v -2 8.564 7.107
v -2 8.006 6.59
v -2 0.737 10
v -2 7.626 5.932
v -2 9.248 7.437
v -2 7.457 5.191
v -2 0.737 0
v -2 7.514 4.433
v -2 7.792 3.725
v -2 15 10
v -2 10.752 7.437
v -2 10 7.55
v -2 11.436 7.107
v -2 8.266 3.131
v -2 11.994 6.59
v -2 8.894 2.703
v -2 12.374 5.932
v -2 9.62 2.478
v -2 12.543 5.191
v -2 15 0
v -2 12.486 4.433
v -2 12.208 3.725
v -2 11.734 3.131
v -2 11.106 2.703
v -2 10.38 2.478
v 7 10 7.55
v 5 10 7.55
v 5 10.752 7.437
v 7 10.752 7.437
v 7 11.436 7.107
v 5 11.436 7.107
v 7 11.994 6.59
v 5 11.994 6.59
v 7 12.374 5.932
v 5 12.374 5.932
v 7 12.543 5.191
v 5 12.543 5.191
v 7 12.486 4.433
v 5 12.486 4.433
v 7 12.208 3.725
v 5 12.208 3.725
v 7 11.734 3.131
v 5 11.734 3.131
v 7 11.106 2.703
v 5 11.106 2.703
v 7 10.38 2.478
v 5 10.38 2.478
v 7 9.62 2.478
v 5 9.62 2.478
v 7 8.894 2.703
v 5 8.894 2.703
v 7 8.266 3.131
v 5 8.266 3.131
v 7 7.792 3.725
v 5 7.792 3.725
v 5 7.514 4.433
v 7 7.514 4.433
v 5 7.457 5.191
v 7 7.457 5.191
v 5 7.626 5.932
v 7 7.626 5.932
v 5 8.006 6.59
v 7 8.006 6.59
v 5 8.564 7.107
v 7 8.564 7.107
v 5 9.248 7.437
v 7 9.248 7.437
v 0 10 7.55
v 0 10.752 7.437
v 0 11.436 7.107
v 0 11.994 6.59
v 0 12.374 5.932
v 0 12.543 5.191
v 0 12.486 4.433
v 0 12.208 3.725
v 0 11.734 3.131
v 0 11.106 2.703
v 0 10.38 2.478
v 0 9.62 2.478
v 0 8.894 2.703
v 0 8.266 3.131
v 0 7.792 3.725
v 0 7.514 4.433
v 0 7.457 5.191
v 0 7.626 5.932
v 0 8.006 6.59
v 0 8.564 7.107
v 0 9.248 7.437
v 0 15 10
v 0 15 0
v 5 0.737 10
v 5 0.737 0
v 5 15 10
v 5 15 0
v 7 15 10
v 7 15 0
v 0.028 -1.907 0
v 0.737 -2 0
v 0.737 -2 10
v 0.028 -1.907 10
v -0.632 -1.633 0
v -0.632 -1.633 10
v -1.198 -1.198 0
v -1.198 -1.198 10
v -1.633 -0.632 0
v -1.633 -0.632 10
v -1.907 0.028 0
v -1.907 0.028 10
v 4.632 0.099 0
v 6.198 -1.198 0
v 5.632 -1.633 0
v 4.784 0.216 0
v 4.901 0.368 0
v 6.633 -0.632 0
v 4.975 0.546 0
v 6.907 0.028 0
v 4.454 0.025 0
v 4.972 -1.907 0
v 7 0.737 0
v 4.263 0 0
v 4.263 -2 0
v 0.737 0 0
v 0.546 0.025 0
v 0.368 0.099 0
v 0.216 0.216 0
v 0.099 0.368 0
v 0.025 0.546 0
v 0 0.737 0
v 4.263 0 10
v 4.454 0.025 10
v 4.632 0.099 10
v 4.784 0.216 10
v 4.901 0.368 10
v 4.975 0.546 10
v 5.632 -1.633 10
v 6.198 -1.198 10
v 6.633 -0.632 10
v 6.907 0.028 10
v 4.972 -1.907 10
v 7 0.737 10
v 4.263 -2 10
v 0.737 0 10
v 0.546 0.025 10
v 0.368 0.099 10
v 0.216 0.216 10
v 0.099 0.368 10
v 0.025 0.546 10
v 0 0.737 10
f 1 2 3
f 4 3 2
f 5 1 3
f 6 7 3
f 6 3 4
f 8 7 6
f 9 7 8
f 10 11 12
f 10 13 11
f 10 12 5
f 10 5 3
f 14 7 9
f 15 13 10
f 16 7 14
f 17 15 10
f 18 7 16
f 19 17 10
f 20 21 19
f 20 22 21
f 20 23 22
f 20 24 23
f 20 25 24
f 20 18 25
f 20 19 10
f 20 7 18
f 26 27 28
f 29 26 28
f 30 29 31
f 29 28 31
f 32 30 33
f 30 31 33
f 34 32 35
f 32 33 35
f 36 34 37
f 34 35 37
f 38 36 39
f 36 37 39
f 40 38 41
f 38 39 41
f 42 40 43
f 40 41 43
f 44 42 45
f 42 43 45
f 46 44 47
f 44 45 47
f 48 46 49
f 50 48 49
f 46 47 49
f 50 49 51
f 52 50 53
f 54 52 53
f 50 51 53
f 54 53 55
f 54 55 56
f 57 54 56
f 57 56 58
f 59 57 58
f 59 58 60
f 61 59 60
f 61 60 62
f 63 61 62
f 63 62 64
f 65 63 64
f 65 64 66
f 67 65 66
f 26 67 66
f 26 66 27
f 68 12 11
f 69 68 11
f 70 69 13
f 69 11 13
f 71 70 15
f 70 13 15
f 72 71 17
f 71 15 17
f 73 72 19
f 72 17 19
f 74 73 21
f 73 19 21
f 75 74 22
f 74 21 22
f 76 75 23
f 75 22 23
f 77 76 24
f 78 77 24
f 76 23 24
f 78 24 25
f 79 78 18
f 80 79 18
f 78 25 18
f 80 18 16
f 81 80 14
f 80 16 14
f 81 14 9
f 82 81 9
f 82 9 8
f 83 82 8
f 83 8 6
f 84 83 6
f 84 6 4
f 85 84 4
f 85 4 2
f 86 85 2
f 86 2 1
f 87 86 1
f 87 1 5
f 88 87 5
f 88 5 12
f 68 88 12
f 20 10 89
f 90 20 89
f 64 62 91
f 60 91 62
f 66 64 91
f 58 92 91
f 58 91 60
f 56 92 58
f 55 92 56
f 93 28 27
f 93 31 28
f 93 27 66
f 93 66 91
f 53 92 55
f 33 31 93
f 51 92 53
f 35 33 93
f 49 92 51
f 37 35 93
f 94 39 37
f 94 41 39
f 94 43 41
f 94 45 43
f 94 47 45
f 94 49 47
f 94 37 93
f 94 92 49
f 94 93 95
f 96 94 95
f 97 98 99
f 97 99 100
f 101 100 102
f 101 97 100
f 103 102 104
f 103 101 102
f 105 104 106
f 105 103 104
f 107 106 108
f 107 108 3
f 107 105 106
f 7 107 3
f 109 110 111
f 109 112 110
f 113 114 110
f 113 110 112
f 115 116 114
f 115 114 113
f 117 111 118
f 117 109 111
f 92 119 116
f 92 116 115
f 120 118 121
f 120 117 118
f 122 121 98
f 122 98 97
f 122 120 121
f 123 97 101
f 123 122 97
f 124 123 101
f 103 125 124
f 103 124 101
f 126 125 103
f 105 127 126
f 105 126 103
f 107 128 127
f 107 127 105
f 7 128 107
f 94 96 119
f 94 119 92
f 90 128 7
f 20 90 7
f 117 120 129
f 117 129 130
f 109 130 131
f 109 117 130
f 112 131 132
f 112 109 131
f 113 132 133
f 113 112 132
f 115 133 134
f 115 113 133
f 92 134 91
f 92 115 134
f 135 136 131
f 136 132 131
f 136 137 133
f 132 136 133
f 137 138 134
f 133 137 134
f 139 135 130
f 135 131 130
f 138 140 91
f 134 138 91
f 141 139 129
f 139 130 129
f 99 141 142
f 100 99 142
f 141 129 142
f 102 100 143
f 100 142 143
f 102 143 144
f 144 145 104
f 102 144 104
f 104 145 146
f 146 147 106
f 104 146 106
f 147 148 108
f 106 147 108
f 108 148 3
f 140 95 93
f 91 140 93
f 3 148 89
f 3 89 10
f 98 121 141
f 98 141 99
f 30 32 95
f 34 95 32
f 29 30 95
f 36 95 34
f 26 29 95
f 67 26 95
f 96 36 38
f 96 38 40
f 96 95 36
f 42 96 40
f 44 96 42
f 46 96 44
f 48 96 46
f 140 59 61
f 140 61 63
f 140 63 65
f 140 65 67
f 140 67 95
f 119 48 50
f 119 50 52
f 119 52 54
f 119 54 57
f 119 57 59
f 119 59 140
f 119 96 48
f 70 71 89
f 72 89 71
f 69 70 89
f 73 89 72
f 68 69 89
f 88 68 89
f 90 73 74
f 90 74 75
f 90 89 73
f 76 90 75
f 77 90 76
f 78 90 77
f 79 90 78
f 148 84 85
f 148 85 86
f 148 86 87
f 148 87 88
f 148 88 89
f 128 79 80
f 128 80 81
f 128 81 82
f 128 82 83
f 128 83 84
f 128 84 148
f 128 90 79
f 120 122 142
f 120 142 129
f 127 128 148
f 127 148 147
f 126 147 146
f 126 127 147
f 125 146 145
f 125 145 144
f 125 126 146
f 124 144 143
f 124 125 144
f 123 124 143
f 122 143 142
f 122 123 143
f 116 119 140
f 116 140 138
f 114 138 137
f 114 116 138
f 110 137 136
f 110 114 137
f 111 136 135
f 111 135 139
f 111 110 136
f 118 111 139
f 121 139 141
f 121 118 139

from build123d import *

# Parameters (mm, degrees)
BASE_FLANGE1_DEPTH = 10
SKETCH6_R          = 2.55
CUT_EXTRUDE1_DEPTH = 21.14944168


# Sheet-metal steps are written as plain solids
with BuildPart() as part:
    # Sketch1 → Base-Flange1 (new body)
    with BuildSketch(Plane.XY):
        with BuildLine():
            Line((0, 15), (0, 0.7366))
            ThreePointArc((0, 0.7366), (0.215745145, 0.215745145), (0.7366, 0))
            Line((0.7366, 0), (4.2634, 0))
            ThreePointArc((4.2634, 0), (4.784254855, 0.215745145), (5, 0.7366))
            Line((5, 0.7366), (5, 15))
            Line((5, 15), (7, 15))
            Line((7, 15), (7, 0.7366))
            ThreePointArc((7, 0.7366), (6.198468417, -1.198468417), (4.2634, -2))
            Line((4.2634, -2), (0.7366, -2))
            ThreePointArc((0.7366, -2), (-1.198468417, -1.198468417), (-2, 0.7366))
            Line((-2, 0.7366), (-2, 15))
            Line((-2, 15), (0, 15))
        make_face()
    extrude(amount=BASE_FLANGE1_DEPTH)

    # Sketch6 → Cut-Extrude1 (cut, through all)
    with BuildSketch(Plane.ZY.offset(2)):
        with Locations((5, 10)):
            Circle(SKETCH6_R)
    extrude(amount=-CUT_EXTRUDE1_DEPTH, mode=Mode.SUBTRACT)


solid = part.part
